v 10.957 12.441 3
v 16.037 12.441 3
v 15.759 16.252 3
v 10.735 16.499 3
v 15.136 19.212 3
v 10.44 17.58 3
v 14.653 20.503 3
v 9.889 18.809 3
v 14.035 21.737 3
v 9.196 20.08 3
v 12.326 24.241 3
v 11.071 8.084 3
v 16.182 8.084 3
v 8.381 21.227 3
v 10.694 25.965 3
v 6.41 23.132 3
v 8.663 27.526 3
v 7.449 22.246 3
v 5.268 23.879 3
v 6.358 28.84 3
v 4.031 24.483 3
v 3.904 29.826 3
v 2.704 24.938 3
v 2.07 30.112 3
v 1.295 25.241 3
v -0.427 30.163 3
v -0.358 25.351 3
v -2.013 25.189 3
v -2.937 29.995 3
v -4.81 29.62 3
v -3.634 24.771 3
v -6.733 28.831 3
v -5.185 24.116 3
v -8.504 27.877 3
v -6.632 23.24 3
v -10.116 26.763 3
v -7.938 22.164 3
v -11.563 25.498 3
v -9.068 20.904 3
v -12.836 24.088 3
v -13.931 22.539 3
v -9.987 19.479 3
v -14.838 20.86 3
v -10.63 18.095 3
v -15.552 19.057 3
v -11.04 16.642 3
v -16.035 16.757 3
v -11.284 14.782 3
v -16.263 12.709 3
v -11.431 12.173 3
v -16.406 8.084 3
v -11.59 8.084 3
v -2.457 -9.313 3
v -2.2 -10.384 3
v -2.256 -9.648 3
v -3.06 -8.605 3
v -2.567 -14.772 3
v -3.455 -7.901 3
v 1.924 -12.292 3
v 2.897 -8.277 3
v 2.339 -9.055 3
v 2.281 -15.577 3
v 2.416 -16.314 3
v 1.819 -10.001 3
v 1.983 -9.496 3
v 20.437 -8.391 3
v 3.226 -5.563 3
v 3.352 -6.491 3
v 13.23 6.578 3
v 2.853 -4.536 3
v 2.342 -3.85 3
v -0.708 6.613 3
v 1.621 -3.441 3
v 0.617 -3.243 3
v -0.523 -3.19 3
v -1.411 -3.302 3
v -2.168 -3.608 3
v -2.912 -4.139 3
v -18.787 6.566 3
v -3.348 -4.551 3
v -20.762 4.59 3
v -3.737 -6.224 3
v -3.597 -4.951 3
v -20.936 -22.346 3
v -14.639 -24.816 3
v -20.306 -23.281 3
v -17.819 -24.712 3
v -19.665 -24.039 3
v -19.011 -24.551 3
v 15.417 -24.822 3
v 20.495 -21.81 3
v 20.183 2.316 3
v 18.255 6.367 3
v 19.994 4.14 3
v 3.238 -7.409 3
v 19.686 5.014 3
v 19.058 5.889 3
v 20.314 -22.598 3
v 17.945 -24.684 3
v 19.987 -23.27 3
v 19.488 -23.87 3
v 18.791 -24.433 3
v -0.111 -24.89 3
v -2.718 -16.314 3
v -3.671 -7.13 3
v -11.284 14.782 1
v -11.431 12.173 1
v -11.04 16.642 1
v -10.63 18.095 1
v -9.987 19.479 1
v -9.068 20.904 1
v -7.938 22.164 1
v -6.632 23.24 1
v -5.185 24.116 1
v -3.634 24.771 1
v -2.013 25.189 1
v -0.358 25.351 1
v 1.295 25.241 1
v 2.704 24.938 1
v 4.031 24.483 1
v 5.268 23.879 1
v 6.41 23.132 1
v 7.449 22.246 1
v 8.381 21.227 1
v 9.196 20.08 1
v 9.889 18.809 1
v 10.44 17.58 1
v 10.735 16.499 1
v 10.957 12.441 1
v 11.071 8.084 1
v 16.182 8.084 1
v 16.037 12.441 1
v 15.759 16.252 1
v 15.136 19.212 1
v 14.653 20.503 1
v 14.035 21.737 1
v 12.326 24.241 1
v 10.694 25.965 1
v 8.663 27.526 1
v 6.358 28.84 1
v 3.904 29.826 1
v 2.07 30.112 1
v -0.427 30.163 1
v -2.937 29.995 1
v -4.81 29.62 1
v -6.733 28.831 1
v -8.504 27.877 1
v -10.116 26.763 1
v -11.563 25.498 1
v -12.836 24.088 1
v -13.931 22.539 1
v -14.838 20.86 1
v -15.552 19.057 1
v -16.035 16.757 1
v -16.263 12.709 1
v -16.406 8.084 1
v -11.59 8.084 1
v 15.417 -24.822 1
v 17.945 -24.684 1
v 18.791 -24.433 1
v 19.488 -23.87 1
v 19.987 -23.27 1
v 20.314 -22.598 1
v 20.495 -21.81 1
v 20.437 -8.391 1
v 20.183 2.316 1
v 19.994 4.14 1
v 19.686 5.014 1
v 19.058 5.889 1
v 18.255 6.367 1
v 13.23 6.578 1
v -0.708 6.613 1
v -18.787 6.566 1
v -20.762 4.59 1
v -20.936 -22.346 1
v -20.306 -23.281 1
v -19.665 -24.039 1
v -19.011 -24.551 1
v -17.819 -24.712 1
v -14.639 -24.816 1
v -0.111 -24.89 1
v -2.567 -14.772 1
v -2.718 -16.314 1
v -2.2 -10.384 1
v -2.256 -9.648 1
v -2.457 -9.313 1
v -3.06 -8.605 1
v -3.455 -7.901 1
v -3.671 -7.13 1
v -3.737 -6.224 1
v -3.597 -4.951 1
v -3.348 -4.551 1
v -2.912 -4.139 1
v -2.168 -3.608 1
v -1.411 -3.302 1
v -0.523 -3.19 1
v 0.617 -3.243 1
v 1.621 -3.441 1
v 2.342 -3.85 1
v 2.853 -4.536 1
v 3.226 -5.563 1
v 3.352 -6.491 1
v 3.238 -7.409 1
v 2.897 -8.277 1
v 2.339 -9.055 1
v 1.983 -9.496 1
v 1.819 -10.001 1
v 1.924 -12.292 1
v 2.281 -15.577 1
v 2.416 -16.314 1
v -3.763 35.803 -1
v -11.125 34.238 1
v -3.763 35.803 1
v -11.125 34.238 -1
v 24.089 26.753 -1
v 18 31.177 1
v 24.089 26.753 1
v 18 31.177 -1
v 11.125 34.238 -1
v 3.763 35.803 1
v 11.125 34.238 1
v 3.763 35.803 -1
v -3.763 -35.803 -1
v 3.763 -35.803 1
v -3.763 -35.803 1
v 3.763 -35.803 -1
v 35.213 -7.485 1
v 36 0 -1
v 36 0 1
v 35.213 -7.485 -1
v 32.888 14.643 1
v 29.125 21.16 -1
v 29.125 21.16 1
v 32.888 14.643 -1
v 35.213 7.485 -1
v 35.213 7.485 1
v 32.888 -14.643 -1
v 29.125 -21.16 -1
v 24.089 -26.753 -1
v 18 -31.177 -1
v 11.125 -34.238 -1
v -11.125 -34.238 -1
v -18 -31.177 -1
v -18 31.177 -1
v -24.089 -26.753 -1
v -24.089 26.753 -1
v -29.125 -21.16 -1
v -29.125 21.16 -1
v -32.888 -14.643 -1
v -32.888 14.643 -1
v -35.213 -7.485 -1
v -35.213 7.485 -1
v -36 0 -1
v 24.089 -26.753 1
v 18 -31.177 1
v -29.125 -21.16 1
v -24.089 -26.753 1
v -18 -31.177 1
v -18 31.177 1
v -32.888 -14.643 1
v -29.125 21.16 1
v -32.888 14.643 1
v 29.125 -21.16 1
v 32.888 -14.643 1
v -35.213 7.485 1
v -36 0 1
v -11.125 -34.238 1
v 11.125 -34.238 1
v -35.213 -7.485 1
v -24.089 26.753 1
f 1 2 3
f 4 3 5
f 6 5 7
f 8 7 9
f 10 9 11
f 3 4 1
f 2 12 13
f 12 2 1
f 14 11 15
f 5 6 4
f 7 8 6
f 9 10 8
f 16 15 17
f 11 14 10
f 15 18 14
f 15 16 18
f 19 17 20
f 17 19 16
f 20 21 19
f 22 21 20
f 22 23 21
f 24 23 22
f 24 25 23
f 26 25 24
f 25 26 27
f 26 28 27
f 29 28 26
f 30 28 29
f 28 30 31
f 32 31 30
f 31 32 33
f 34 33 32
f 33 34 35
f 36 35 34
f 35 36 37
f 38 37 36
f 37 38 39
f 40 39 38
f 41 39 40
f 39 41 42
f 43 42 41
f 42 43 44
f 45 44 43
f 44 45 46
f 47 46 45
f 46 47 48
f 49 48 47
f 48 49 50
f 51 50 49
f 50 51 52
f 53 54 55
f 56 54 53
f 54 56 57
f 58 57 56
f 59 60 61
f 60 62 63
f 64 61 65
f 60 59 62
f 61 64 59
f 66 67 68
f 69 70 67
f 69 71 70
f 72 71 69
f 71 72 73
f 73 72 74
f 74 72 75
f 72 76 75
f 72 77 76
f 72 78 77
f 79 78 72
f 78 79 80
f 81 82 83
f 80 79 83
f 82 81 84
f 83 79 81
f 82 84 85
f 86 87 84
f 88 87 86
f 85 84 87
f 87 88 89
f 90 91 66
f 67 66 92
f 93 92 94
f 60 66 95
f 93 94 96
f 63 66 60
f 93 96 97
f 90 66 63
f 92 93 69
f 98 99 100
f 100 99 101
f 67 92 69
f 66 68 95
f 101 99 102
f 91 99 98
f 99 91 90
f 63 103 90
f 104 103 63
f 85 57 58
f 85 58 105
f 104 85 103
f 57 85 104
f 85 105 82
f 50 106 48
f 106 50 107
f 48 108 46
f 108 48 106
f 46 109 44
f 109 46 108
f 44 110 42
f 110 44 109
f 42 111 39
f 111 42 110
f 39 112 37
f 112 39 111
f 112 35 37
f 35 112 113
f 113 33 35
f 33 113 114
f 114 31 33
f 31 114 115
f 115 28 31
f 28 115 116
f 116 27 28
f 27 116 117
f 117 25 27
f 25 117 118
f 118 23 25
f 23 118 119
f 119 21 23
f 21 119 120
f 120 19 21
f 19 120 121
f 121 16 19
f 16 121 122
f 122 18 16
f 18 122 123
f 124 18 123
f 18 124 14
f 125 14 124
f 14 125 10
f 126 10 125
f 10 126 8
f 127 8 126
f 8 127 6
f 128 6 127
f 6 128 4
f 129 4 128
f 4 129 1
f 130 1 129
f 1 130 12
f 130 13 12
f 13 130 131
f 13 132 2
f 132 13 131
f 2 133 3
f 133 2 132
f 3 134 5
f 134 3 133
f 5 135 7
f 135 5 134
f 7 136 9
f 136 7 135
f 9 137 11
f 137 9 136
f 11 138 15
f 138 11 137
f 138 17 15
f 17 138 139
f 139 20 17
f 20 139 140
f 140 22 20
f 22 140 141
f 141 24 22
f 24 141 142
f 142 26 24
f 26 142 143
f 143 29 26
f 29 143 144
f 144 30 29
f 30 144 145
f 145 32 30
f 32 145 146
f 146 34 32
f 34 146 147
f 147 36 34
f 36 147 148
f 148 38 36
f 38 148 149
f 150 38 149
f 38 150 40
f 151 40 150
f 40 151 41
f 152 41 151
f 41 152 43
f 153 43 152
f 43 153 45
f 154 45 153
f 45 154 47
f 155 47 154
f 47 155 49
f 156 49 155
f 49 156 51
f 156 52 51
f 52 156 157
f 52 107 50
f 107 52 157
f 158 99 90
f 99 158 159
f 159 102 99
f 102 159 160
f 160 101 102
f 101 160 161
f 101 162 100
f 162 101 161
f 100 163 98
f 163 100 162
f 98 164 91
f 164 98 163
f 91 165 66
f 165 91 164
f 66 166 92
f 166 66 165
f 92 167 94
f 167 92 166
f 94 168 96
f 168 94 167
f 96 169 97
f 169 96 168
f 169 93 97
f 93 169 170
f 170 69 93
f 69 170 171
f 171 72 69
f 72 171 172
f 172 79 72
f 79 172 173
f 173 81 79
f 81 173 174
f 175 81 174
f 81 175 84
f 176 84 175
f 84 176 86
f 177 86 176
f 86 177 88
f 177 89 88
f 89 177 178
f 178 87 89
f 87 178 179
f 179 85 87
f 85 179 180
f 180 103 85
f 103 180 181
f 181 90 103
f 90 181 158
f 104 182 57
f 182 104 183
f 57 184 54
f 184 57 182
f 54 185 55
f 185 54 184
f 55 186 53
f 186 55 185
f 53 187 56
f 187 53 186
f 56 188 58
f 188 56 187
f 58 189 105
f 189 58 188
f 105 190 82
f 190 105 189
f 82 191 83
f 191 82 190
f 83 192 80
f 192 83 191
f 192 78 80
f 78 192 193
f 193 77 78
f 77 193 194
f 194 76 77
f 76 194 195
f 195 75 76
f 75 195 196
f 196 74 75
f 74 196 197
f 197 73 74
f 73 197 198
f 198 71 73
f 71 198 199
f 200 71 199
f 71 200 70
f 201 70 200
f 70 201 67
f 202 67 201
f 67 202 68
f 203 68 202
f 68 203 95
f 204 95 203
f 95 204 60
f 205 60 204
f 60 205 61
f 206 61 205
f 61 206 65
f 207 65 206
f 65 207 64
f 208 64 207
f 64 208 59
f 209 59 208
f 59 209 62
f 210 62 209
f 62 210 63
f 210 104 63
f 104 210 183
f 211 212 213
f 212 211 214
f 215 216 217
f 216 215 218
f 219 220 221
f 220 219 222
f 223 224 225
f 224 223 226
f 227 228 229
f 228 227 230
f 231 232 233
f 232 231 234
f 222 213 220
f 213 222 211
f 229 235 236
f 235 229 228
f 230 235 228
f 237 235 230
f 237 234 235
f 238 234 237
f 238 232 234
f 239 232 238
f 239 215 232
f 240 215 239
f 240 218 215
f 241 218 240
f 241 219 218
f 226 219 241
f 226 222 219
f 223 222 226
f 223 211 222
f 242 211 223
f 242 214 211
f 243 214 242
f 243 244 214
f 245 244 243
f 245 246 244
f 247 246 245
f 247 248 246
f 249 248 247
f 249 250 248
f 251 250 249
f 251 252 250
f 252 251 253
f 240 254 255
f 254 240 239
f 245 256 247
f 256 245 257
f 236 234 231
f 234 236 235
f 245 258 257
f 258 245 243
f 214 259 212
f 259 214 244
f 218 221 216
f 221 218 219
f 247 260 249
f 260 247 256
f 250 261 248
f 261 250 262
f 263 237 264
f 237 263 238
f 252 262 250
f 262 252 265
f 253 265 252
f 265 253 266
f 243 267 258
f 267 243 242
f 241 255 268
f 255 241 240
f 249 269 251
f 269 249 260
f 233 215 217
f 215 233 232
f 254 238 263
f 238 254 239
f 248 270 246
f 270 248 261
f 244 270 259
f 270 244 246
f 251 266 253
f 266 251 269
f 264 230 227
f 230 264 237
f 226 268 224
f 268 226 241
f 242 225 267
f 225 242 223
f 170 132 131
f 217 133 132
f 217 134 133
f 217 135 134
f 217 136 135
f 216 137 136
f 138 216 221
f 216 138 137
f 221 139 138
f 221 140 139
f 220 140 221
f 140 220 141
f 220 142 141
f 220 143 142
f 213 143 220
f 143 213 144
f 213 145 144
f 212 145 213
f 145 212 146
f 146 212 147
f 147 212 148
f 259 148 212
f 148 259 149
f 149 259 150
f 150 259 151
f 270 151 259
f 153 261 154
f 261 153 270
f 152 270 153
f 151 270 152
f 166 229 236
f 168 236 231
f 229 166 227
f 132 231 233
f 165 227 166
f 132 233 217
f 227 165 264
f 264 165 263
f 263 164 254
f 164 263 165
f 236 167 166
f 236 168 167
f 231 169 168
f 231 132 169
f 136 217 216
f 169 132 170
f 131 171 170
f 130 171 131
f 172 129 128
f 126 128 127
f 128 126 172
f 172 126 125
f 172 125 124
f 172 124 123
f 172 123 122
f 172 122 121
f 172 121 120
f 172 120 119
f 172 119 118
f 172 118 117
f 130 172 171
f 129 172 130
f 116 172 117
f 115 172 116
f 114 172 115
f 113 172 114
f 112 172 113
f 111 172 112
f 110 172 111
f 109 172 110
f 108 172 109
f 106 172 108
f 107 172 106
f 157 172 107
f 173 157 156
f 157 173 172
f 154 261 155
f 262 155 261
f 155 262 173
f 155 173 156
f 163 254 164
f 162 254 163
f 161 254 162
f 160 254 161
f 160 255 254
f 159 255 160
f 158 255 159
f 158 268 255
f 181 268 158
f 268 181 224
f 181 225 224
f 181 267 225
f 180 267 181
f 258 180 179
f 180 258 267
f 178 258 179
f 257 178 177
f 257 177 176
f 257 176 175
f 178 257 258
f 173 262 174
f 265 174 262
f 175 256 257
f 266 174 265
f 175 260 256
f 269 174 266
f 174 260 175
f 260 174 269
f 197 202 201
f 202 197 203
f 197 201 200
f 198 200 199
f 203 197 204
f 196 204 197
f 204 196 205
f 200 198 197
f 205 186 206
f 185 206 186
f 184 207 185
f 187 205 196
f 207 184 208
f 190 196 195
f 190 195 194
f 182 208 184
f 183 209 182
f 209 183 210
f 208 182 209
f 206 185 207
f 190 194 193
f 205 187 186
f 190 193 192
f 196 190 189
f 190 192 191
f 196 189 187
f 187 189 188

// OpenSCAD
translate([-102,0,0]) scale([0.95,0.95,1]) linear_extrude(3) import("lock.dxf");
cylinder(r=36, h=2, center=true);
